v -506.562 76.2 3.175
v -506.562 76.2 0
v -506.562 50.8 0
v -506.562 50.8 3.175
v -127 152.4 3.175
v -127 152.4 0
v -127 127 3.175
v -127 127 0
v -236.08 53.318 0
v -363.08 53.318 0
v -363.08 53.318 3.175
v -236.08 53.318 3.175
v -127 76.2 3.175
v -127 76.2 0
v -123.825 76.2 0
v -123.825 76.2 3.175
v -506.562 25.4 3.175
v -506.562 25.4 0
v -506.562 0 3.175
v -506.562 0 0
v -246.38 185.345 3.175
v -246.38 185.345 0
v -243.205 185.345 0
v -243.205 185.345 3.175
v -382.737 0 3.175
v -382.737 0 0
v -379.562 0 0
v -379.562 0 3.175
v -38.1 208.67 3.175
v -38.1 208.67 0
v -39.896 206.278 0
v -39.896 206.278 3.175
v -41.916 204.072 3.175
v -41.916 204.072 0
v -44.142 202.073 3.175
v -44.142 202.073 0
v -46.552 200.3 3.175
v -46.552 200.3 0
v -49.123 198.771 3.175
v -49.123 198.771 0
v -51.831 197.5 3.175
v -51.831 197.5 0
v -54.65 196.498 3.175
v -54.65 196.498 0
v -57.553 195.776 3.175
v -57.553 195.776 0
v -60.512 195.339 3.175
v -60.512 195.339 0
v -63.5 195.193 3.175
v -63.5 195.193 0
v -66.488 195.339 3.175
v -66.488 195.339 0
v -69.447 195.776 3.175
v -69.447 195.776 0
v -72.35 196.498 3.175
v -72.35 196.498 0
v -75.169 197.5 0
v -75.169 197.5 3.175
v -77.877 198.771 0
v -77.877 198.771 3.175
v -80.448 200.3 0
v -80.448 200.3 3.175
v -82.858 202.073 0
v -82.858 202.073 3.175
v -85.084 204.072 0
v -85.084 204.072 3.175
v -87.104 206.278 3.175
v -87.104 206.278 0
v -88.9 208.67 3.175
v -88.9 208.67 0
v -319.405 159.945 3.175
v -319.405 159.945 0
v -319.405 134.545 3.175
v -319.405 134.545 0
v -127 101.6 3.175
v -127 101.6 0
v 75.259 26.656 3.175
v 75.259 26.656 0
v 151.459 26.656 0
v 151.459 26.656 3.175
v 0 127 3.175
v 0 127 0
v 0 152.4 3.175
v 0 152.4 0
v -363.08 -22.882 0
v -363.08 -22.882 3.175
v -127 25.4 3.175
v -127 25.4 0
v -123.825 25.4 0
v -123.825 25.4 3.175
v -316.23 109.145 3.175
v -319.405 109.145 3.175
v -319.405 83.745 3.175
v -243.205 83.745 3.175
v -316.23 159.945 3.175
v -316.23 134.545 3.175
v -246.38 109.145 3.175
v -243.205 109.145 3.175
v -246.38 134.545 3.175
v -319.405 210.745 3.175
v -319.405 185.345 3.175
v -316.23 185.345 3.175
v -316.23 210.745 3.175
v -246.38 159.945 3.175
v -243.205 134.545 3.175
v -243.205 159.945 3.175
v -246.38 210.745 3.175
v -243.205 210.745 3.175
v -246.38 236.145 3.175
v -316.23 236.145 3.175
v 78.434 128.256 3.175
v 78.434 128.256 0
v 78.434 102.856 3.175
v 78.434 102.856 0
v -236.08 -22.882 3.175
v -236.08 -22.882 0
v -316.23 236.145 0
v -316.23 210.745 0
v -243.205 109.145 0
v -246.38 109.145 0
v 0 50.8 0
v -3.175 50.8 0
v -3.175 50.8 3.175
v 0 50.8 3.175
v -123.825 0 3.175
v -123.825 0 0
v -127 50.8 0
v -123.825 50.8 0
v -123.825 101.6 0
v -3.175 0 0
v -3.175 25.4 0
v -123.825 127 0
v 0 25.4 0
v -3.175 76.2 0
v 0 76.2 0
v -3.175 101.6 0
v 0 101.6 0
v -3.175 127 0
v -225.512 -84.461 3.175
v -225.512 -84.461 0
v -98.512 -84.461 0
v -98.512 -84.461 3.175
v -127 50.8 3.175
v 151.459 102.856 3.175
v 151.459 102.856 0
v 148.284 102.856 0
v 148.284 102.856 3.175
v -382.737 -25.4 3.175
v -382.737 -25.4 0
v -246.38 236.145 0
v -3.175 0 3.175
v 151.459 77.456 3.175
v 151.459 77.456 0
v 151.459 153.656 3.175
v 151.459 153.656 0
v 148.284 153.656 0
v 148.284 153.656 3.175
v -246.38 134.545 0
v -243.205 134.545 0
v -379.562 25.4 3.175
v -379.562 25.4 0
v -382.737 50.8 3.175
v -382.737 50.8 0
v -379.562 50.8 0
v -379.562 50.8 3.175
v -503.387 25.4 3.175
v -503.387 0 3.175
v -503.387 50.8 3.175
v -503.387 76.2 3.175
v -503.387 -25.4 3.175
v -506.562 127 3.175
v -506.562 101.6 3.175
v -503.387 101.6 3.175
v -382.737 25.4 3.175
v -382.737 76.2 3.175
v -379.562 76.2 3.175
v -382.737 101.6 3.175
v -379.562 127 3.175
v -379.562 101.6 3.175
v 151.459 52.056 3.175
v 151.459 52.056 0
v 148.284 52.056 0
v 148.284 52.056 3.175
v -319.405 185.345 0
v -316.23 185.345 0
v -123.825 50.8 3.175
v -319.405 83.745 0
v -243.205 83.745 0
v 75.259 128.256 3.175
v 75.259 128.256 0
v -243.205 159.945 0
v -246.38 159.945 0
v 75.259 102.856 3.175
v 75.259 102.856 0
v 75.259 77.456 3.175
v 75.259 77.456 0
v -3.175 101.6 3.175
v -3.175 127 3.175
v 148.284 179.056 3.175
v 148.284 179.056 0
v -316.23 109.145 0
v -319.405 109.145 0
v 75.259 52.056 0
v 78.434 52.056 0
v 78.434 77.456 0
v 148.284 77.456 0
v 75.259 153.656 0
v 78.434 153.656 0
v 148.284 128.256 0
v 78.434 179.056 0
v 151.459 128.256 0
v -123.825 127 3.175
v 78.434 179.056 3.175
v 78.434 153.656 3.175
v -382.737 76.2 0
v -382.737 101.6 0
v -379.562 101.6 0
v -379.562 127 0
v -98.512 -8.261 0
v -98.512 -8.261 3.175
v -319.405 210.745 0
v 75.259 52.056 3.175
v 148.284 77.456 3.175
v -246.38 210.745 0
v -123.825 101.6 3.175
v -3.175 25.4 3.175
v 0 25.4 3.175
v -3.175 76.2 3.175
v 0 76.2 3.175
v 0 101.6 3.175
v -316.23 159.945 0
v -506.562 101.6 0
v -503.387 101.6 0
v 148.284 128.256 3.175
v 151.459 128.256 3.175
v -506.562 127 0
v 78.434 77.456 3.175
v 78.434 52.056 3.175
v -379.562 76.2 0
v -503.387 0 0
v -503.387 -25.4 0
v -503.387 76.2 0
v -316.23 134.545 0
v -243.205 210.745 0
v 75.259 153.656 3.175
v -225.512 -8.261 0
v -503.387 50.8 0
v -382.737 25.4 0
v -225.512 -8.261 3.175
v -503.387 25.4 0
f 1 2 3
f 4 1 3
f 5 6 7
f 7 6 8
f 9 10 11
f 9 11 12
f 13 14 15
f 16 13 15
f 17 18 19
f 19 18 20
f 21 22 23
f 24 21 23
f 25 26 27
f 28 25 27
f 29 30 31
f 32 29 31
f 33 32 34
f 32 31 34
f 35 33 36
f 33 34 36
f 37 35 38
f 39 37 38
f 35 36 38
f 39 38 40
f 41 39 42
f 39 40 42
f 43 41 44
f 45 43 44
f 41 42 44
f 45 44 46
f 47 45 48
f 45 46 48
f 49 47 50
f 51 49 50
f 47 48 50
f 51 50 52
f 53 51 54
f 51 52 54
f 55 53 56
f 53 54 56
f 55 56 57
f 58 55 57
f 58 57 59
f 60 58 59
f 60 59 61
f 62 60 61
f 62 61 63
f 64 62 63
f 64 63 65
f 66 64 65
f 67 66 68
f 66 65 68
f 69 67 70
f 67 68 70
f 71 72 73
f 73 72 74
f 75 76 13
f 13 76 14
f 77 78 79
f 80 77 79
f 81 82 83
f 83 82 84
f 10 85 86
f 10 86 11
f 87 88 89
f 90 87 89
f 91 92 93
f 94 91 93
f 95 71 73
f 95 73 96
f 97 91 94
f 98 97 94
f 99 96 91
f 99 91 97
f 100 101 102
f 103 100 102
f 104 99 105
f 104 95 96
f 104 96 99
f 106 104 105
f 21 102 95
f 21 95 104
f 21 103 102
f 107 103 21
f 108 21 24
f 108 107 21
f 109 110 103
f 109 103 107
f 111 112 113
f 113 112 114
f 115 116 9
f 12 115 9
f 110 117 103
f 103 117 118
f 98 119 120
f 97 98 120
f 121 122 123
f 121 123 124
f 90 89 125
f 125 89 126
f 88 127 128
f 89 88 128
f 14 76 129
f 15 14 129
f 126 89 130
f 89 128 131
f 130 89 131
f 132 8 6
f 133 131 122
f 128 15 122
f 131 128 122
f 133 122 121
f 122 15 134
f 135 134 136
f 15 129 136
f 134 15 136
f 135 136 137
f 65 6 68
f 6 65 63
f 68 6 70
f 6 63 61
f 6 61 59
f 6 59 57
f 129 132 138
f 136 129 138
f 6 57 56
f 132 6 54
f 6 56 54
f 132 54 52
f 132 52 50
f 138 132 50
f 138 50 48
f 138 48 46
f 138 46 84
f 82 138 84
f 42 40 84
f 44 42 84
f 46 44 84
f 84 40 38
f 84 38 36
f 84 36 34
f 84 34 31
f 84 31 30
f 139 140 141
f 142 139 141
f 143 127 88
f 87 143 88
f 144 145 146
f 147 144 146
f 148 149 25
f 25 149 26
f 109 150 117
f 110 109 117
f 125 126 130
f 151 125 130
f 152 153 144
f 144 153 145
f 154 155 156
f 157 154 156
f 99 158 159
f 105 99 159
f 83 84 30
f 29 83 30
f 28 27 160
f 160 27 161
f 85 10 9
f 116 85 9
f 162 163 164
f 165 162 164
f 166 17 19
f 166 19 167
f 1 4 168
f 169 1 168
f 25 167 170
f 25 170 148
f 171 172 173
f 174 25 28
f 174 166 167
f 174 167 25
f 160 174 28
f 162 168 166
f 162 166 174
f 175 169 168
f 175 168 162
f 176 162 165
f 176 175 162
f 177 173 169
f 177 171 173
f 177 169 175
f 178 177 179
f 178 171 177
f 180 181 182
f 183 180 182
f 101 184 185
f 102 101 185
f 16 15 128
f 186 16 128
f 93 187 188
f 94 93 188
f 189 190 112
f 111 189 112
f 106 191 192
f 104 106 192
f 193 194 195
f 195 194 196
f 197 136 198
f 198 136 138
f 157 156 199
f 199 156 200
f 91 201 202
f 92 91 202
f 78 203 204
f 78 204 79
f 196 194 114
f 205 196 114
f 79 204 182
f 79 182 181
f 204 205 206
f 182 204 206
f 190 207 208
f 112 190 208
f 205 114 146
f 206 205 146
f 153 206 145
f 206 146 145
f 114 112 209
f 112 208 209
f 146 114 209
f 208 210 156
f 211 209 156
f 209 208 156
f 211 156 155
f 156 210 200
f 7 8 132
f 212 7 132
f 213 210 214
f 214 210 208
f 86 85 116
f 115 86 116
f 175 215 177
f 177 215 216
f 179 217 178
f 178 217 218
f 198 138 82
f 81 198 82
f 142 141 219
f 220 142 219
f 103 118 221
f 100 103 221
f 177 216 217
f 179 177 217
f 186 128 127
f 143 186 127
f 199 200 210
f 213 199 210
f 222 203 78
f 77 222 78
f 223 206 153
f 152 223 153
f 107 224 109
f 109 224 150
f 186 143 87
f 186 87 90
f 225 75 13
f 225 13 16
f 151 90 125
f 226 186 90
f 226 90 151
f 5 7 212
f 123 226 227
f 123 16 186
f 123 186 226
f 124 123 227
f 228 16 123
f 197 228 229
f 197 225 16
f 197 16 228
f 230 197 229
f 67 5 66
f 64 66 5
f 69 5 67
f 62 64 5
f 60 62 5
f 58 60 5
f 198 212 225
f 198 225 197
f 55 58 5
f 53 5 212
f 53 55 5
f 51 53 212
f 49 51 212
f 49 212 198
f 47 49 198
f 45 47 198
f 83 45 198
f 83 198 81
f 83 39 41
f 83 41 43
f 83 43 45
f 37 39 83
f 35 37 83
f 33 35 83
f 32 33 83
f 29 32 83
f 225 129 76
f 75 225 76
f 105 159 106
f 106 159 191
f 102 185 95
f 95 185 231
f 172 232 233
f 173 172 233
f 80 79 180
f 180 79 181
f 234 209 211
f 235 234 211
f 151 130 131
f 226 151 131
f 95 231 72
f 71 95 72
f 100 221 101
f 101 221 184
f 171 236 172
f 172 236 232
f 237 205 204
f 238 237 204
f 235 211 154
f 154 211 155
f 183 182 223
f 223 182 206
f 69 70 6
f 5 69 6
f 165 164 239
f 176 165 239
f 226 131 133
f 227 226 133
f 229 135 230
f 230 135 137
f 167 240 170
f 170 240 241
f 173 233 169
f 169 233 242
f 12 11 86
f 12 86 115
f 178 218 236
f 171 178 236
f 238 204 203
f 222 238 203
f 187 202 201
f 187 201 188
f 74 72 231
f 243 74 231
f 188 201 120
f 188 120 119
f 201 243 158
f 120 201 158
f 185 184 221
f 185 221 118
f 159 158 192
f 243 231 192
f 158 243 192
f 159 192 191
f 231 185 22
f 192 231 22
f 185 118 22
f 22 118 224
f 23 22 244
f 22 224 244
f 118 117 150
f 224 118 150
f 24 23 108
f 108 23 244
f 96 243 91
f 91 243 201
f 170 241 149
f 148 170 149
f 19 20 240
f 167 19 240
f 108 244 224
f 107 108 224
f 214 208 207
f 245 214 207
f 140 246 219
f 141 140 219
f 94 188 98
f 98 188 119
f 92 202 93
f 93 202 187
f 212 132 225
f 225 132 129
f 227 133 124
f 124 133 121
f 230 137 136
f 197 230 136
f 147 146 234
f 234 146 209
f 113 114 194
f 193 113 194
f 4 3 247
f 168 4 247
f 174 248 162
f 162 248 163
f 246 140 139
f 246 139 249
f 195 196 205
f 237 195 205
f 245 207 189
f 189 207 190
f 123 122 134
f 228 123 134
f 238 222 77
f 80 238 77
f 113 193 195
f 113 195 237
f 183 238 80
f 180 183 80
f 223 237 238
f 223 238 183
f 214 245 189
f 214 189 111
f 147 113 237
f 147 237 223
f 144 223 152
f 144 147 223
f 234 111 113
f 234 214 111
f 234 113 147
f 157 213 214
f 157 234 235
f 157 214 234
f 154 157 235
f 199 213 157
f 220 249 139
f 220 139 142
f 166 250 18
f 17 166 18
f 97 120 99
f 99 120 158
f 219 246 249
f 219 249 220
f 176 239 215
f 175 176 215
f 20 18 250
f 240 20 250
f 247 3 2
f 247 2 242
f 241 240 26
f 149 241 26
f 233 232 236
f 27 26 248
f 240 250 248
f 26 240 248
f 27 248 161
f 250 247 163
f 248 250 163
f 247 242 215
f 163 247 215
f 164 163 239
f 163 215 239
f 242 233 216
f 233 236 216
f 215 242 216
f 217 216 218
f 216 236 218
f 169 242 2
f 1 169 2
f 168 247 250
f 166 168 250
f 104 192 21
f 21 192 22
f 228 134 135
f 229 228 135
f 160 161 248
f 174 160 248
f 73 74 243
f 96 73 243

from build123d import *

# Parameters (mm, degrees)
F0_W     = 3.175
F0_H     = 25.4
F0_W_2   = 127
F0_H_2   = 76.2
F1_DEPTH = 3.175


with BuildPart() as f1:
    # F0 (on Top) → F1 (new body)
    with BuildSketch(Plane.XY):
        with BuildLine():
            Line((-123.825, 25.4), (-123.825, 0))
            Line((-123.825, 0), (-3.175, 0))
            Line((-3.175, 0), (-3.175, 25.4))
            Line((-3.175, 25.4), (-3.175, 50.8))
            Line((-3.175, 50.8), (-3.175, 76.2))
            Line((-3.175, 76.2), (0, 76.2))
            Line((0, 76.2), (0, 101.6))
            Line((0, 101.6), (-3.175, 101.6))
            Line((-3.175, 101.6), (-3.175, 127))
            Line((-3.175, 127), (0, 127))
            Line((0, 127), (0, 152.4))
            Line((0, 152.4), (-38.1, 208.66995))
            ThreePointArc((-38.1, 208.66995), (-63.5, 195.193422), (-88.9, 208.66995))
            Line((-88.9, 208.66995), (-127, 152.4))
            Line((-127, 152.4), (-127, 127))
            Line((-127, 127), (-123.825, 127))
            Line((-123.825, 127), (-123.825, 101.6))
            Line((-123.825, 101.6), (-127, 101.6))
            Line((-127, 101.6), (-127, 76.2))
            Line((-127, 76.2), (-123.825, 76.2))
            Line((-123.825, 76.2), (-123.825, 50.8))
            Line((-123.825, 50.8), (-127, 50.8))
            Line((-127, 50.8), (-127, 25.4))
            Line((-127, 25.4), (-123.825, 25.4))
        make_face()
        with Locations((-1.5875, 38.1)):
            Rectangle(F0_W, F0_H)
        Polygon((-246.380082, 236.144556), (-316.230082, 236.144556), (-316.230082, 210.744556), (-319.405082, 210.744556), (-319.405082, 185.344556), (-316.230082, 185.344556), (-316.230082, 159.944556), (-319.405082, 159.944556), (-319.405082, 134.544556), (-316.230082, 134.544556), (-316.230082, 109.144556), (-319.405082, 109.144556), (-319.405082, 83.744556), (-243.205082, 83.744556), (-243.205082, 109.144556), (-246.380082, 109.144556), (-246.380082, 134.544556), (-243.205082, 134.544556), (-243.205082, 159.944556), (-246.380082, 159.944556), (-246.380082, 185.344556), (-243.205082, 185.344556), (-243.205082, 210.744556), (-246.380082, 210.744556), align=None)
        with Locations((-162.01187, -46.360558)):
            Rectangle(F0_W_2, F0_H_2)
        Polygon((-379.561812, 127), (-506.561812, 127), (-506.561812, 101.6), (-503.386812, 101.6), (-503.386812, 76.2), (-506.561812, 76.2), (-506.561812, 50.8), (-503.386812, 50.8), (-503.386812, 25.4), (-506.561812, 25.4), (-506.561812, 0), (-503.386812, 0), (-503.386812, -25.4), (-382.736812, -25.4), (-382.736812, 0), (-379.561812, 0), (-379.561812, 25.4), (-382.736812, 25.4), (-382.736812, 50.8), (-379.561812, 50.8), (-379.561812, 76.2), (-382.736812, 76.2), (-382.736812, 101.6), (-379.561812, 101.6), align=None)
        with Locations((-299.579901, 15.218221)):
            Rectangle(F0_W_2, F0_H_2)
        Polygon((148.28359, 179.055724), (78.43359, 179.055724), (78.43359, 153.655724), (75.25859, 153.655724), (75.25859, 128.255724), (78.43359, 128.255724), (78.43359, 102.855724), (75.25859, 102.855724), (75.25859, 77.455724), (78.43359, 77.455724), (78.43359, 52.055724), (75.25859, 52.055724), (75.25859, 26.655724), (151.45859, 26.655724), (151.45859, 52.055724), (148.28359, 52.055724), (148.28359, 77.455724), (151.45859, 77.455724), (151.45859, 102.855724), (148.28359, 102.855724), (148.28359, 128.255724), (151.45859, 128.255724), (151.45859, 153.655724), (148.28359, 153.655724), align=None)
    extrude(amount=F1_DEPTH)


solid = f1.part
